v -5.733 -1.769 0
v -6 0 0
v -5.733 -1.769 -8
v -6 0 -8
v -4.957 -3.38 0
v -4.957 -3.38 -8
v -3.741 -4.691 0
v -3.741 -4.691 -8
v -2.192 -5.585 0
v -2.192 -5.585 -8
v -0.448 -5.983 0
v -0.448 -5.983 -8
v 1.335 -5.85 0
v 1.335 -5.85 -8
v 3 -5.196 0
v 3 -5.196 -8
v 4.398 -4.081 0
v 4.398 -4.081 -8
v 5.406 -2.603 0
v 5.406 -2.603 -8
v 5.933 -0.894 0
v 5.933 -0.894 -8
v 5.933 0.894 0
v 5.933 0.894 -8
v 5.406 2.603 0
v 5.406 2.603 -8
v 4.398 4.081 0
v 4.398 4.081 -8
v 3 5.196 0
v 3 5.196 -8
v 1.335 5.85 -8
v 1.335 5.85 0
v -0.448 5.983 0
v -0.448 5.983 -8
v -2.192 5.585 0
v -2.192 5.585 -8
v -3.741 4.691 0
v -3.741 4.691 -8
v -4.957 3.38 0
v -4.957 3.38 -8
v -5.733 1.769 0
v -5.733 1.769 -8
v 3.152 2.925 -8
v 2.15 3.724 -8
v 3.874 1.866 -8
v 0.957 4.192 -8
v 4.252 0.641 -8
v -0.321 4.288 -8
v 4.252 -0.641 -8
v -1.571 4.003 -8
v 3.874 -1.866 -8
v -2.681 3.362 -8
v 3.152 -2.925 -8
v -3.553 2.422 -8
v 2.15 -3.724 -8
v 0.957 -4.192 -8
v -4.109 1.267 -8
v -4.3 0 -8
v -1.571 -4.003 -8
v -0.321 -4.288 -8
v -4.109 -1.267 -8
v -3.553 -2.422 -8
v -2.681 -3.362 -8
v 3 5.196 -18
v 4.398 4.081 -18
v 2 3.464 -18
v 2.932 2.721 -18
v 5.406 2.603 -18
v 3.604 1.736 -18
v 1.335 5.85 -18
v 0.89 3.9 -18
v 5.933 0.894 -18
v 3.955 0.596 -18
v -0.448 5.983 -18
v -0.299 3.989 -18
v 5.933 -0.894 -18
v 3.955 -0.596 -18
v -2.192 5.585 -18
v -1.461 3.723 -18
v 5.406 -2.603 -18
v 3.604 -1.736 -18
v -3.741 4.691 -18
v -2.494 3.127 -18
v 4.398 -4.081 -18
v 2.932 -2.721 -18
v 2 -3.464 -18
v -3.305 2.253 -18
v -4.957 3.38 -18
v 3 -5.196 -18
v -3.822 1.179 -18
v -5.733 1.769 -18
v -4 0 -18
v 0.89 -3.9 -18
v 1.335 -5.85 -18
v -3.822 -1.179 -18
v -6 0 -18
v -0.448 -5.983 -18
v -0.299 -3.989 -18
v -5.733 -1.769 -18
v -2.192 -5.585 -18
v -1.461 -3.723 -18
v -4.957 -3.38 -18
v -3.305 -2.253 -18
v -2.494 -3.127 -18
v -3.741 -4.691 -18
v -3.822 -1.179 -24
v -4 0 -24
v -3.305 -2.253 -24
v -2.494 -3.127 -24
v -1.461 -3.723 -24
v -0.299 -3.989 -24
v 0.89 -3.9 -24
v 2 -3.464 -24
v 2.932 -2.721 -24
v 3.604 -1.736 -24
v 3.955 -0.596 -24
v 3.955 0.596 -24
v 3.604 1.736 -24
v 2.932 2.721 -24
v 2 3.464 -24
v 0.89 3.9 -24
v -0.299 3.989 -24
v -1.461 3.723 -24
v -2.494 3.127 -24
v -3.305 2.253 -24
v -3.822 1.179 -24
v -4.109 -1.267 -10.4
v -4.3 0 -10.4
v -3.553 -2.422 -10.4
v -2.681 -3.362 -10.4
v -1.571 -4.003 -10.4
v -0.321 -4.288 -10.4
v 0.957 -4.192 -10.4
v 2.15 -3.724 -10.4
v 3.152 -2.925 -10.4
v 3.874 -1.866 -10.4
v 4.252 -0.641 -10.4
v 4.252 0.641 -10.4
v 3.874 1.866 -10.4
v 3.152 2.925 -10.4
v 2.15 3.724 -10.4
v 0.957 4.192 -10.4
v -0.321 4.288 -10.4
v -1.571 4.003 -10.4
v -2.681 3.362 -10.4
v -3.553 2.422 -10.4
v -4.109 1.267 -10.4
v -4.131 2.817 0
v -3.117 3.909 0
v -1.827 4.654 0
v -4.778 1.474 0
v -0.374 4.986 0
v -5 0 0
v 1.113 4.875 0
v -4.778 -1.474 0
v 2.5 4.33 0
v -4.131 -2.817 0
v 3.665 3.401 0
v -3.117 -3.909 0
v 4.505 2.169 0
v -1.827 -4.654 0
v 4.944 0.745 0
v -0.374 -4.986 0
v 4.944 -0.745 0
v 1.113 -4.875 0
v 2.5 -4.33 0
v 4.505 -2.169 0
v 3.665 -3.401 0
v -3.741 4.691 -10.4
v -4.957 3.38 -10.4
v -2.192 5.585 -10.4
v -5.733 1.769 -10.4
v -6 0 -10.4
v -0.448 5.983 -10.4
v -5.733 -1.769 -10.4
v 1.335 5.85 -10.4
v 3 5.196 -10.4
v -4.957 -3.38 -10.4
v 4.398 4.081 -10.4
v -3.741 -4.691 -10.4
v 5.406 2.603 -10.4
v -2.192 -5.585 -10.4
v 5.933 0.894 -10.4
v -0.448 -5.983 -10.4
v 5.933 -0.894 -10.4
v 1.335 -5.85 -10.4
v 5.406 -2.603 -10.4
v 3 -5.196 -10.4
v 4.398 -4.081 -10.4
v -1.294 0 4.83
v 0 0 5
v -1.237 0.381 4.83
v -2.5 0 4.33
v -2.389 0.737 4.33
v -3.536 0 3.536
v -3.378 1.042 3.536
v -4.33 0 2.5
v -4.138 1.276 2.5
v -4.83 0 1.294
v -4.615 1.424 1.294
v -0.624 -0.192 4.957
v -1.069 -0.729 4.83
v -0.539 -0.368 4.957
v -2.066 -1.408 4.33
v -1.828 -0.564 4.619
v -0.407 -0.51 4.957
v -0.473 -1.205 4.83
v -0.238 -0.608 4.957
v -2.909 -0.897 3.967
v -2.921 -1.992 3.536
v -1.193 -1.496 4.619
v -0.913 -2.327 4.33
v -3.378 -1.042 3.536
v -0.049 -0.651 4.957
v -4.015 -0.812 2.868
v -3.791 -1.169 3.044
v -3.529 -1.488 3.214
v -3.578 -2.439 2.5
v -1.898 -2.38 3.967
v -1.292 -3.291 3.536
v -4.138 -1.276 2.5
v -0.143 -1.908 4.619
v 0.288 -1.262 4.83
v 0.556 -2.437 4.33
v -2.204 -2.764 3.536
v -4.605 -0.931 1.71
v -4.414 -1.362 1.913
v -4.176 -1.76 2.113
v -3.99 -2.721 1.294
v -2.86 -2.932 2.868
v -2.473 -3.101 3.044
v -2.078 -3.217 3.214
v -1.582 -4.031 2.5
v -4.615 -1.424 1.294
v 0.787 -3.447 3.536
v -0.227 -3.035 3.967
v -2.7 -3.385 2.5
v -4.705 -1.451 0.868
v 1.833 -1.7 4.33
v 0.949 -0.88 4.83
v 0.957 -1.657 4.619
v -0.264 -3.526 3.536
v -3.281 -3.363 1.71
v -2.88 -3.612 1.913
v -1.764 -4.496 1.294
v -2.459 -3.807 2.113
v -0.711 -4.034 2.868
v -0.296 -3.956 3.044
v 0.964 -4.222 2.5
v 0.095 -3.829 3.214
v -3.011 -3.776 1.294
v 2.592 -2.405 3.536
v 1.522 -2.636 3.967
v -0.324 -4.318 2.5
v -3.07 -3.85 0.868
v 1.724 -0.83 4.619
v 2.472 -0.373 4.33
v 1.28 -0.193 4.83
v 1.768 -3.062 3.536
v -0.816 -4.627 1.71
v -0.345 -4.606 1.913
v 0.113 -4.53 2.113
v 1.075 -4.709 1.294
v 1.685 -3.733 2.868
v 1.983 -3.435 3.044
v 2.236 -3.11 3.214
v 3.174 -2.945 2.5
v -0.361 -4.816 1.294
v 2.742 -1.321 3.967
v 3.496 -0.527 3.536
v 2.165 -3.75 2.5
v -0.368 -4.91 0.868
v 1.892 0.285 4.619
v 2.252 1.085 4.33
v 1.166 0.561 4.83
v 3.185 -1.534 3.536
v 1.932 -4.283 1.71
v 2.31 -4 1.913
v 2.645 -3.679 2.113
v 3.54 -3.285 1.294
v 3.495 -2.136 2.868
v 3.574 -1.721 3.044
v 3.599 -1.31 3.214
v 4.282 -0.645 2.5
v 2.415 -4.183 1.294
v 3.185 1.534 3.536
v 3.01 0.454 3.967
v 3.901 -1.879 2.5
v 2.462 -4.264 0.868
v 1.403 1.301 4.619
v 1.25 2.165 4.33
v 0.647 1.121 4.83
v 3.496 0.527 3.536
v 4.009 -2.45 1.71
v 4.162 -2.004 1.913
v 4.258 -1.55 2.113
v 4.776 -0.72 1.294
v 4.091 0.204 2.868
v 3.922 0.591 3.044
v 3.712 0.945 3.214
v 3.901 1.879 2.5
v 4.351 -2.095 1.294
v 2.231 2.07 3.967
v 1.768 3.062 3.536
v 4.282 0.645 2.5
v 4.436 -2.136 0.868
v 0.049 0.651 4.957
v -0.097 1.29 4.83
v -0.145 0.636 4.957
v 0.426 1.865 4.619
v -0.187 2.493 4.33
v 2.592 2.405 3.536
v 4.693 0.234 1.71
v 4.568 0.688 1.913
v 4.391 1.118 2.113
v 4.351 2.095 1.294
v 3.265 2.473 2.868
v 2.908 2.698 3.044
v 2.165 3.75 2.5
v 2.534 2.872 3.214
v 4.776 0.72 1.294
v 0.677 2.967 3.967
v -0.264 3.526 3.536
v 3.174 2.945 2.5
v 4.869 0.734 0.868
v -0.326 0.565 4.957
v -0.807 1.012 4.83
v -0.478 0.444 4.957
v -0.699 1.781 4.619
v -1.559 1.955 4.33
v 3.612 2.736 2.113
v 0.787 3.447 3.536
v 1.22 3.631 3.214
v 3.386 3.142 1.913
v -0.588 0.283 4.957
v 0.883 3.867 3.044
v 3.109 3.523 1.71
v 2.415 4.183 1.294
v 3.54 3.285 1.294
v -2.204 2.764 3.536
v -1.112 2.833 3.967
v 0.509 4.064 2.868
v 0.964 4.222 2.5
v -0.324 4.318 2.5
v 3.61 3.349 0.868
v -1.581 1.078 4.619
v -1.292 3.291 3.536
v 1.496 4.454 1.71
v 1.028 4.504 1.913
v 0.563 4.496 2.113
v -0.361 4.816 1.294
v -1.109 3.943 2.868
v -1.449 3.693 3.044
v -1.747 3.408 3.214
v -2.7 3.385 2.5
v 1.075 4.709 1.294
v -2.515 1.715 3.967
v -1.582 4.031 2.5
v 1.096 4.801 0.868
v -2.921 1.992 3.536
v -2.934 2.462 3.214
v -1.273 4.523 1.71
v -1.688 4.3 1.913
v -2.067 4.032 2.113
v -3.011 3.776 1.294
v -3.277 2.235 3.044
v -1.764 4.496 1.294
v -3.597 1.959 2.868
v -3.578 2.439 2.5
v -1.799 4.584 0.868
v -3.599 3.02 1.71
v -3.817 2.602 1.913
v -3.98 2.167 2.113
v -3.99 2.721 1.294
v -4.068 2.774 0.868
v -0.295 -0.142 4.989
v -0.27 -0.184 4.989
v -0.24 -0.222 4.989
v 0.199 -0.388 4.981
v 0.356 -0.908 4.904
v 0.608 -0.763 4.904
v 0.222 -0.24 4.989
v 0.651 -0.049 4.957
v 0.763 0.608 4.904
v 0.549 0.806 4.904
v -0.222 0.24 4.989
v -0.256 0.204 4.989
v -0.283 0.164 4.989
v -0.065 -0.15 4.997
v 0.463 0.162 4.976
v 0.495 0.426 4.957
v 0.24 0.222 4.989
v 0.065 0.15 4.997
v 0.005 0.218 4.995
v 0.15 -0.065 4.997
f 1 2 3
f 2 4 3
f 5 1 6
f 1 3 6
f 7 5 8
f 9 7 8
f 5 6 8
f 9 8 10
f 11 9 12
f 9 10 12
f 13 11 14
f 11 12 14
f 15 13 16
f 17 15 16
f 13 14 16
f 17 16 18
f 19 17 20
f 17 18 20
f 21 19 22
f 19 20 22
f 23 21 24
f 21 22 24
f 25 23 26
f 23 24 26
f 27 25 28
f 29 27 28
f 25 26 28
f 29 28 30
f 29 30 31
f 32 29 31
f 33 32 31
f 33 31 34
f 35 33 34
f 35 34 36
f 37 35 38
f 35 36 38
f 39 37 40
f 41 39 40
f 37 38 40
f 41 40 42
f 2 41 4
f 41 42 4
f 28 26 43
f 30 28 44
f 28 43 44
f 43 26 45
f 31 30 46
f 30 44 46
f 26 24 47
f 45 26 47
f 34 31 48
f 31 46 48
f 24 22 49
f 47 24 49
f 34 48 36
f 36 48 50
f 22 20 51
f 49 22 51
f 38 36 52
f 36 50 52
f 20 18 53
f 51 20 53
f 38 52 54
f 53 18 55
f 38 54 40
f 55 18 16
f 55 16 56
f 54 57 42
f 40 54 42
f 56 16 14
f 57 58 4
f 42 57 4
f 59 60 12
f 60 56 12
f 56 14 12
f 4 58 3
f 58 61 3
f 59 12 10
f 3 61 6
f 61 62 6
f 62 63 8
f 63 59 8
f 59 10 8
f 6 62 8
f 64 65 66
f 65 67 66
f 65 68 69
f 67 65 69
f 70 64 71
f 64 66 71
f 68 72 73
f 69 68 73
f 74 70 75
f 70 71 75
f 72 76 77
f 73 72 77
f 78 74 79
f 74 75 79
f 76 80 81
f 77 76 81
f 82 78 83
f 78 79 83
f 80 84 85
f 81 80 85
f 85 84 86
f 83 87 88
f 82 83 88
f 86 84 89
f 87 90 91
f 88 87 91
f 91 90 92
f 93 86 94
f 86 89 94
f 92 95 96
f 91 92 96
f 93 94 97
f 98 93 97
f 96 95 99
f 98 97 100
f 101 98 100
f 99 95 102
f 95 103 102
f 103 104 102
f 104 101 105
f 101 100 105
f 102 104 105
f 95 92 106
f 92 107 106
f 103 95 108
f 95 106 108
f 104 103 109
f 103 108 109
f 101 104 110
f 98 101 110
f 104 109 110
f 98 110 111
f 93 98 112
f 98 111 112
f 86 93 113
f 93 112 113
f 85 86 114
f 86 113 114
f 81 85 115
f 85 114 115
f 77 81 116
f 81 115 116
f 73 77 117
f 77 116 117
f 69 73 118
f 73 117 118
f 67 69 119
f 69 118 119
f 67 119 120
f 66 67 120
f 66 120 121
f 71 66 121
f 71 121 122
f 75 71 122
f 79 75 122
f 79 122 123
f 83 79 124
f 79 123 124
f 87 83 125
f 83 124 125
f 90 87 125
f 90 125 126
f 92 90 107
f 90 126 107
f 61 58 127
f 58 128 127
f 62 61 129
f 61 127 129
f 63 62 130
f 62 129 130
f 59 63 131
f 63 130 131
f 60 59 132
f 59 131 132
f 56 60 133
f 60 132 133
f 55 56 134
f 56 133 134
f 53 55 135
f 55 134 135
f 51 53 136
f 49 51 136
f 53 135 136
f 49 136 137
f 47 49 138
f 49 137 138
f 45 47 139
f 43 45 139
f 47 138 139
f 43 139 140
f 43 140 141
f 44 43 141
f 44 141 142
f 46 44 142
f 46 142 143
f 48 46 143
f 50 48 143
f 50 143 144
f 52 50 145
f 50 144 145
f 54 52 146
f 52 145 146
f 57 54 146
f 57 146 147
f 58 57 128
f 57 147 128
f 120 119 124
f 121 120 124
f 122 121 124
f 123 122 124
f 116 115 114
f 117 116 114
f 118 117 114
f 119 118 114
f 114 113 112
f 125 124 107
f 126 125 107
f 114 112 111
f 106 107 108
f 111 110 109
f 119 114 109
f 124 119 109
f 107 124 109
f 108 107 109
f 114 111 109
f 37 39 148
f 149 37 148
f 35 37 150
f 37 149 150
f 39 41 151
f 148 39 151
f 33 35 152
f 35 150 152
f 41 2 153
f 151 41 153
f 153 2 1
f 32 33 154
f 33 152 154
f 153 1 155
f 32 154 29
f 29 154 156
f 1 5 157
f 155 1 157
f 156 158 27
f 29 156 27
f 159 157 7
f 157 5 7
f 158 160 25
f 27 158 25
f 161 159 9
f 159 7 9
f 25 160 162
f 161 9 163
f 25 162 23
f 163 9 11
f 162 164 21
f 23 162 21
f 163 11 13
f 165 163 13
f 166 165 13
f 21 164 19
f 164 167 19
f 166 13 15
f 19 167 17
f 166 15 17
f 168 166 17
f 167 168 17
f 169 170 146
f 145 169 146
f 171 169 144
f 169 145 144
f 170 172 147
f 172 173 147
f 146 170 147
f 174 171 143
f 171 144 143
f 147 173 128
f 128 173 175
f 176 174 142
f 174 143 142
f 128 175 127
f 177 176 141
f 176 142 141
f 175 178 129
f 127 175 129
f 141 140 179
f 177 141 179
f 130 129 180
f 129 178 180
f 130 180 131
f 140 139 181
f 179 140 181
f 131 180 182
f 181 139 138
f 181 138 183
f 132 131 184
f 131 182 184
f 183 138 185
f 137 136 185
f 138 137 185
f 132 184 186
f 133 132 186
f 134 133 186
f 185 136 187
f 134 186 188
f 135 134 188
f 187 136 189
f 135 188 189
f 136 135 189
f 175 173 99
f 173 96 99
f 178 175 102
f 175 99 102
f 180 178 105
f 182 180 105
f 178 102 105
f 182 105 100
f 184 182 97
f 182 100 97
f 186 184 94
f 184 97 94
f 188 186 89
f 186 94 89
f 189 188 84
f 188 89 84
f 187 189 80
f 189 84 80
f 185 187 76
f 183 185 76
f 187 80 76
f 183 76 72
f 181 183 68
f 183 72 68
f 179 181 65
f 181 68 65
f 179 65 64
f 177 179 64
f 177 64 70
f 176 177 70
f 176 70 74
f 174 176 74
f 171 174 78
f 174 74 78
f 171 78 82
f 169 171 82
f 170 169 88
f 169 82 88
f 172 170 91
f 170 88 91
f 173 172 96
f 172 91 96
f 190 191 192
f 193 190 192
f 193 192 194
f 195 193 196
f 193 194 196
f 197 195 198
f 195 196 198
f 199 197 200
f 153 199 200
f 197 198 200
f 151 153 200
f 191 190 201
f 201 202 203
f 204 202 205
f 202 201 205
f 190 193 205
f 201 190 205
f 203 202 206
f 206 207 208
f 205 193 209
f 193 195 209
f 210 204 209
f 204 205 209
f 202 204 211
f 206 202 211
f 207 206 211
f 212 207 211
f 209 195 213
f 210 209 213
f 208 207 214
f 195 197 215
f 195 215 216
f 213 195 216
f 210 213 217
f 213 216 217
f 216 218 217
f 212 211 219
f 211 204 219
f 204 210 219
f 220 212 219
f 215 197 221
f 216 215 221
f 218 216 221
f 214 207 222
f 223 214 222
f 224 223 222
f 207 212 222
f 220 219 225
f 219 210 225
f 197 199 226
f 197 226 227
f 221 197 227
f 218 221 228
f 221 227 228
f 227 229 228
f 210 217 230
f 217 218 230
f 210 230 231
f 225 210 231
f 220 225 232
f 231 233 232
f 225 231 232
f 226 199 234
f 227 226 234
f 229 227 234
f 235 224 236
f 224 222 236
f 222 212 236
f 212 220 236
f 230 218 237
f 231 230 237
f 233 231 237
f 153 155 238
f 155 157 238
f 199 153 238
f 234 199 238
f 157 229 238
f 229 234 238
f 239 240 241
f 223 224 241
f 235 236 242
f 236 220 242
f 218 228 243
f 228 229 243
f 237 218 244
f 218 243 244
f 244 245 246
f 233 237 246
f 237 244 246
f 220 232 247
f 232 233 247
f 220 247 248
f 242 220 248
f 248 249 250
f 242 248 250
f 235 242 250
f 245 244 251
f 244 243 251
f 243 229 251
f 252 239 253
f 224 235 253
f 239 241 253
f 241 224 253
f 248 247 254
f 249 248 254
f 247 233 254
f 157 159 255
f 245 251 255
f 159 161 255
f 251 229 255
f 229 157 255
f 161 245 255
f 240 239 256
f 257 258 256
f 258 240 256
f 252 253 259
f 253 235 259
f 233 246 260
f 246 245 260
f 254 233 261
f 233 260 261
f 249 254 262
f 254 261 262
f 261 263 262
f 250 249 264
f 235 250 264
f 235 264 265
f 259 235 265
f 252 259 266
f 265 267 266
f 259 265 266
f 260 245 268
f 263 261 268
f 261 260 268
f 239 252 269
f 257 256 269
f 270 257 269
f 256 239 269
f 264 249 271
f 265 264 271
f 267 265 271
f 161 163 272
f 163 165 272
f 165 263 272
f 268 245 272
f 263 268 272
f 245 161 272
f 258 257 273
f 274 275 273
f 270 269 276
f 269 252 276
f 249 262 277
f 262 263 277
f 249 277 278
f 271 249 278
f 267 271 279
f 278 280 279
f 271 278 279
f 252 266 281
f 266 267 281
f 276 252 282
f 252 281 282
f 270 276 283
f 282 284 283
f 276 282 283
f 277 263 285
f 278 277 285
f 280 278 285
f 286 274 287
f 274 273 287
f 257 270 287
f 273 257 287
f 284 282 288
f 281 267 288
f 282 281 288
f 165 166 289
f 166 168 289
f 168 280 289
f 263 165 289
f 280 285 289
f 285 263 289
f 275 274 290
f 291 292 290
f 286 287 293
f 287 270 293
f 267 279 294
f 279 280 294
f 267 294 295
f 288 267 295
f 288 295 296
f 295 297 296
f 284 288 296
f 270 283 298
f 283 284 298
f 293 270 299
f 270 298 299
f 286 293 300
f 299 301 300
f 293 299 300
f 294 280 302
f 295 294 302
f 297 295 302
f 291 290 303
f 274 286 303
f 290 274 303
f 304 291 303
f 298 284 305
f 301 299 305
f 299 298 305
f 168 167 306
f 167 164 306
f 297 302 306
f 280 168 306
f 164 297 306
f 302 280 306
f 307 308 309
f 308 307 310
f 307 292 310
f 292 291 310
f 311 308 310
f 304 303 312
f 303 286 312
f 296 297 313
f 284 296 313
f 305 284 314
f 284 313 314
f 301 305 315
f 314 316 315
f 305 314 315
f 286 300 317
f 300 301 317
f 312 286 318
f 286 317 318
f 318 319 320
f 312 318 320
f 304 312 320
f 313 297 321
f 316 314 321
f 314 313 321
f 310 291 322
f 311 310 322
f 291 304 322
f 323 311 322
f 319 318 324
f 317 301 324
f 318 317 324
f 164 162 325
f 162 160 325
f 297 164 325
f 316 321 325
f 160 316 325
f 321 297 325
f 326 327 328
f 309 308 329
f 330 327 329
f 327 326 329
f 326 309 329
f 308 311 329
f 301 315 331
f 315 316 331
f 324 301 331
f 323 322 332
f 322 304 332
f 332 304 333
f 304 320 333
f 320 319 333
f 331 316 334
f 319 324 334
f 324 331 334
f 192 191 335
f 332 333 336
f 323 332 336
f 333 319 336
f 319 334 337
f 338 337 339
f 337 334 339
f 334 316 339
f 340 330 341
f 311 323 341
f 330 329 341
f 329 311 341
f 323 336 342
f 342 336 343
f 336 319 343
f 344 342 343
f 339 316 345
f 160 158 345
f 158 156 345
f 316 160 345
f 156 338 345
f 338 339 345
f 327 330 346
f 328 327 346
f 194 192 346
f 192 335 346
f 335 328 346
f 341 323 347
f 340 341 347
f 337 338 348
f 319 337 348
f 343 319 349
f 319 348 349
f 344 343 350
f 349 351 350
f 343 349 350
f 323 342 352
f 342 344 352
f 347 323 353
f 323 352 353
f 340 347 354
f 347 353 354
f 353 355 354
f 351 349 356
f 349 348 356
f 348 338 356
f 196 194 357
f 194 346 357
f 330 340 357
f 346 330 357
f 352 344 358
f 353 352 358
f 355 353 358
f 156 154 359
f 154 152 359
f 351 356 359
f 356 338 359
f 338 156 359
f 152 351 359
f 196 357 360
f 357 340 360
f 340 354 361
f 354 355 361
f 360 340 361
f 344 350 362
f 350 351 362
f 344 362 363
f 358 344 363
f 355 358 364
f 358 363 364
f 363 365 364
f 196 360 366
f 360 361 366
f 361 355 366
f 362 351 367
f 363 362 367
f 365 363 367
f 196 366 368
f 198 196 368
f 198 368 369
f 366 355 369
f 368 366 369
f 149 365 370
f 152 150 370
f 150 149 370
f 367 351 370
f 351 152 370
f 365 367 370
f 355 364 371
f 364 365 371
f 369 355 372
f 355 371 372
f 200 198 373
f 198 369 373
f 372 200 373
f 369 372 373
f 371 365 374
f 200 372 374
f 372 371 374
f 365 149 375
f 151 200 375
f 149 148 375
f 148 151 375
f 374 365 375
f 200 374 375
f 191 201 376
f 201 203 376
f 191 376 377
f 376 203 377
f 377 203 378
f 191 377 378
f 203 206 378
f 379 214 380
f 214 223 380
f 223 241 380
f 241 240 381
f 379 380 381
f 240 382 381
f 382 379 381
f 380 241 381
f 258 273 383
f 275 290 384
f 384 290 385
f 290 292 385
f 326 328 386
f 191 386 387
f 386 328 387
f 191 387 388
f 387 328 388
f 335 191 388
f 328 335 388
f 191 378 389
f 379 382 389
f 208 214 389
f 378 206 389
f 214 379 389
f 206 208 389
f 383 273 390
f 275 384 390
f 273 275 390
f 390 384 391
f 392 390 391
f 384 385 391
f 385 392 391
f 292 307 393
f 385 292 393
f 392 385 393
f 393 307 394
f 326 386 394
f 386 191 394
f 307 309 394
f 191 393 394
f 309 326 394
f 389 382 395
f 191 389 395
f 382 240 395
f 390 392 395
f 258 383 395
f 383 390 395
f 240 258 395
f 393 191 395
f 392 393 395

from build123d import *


with BuildPart() as part:
    # 草图1 → 旋转1 (revolve)
    with BuildSketch(Plane(origin=(0, 0, 0), x_dir=(1, 0, 0), z_dir=(0, 1, 0)), mode=Mode.PRIVATE) as revolve_1_sk:
        with BuildLine():
            Line((5, 0), (6, 0))
            Line((6, 0), (6, 8))
            Line((6, 8), (4.3, 8))
            Line((4.3, 8), (4.3, 10.4))
            Line((4.3, 10.4), (6, 10.4))
            Line((6, 10.4), (6, 18))
            Line((6, 18), (4, 18))
            Line((4, 18), (4, 24))
            Line((4, 24), (0, 24))
            Line((0, 24), (0, -5))
            ThreePointArc((0, -5), (3.5355, -3.5355), (5, 0))
        make_face()
    revolve(revolve_1_sk.sketch.rotate(Axis((0, 0, -30), (0, 0, 1)), 180), axis=Axis((0, 0, -30), (0, 0, 1)))


solid = part.part
